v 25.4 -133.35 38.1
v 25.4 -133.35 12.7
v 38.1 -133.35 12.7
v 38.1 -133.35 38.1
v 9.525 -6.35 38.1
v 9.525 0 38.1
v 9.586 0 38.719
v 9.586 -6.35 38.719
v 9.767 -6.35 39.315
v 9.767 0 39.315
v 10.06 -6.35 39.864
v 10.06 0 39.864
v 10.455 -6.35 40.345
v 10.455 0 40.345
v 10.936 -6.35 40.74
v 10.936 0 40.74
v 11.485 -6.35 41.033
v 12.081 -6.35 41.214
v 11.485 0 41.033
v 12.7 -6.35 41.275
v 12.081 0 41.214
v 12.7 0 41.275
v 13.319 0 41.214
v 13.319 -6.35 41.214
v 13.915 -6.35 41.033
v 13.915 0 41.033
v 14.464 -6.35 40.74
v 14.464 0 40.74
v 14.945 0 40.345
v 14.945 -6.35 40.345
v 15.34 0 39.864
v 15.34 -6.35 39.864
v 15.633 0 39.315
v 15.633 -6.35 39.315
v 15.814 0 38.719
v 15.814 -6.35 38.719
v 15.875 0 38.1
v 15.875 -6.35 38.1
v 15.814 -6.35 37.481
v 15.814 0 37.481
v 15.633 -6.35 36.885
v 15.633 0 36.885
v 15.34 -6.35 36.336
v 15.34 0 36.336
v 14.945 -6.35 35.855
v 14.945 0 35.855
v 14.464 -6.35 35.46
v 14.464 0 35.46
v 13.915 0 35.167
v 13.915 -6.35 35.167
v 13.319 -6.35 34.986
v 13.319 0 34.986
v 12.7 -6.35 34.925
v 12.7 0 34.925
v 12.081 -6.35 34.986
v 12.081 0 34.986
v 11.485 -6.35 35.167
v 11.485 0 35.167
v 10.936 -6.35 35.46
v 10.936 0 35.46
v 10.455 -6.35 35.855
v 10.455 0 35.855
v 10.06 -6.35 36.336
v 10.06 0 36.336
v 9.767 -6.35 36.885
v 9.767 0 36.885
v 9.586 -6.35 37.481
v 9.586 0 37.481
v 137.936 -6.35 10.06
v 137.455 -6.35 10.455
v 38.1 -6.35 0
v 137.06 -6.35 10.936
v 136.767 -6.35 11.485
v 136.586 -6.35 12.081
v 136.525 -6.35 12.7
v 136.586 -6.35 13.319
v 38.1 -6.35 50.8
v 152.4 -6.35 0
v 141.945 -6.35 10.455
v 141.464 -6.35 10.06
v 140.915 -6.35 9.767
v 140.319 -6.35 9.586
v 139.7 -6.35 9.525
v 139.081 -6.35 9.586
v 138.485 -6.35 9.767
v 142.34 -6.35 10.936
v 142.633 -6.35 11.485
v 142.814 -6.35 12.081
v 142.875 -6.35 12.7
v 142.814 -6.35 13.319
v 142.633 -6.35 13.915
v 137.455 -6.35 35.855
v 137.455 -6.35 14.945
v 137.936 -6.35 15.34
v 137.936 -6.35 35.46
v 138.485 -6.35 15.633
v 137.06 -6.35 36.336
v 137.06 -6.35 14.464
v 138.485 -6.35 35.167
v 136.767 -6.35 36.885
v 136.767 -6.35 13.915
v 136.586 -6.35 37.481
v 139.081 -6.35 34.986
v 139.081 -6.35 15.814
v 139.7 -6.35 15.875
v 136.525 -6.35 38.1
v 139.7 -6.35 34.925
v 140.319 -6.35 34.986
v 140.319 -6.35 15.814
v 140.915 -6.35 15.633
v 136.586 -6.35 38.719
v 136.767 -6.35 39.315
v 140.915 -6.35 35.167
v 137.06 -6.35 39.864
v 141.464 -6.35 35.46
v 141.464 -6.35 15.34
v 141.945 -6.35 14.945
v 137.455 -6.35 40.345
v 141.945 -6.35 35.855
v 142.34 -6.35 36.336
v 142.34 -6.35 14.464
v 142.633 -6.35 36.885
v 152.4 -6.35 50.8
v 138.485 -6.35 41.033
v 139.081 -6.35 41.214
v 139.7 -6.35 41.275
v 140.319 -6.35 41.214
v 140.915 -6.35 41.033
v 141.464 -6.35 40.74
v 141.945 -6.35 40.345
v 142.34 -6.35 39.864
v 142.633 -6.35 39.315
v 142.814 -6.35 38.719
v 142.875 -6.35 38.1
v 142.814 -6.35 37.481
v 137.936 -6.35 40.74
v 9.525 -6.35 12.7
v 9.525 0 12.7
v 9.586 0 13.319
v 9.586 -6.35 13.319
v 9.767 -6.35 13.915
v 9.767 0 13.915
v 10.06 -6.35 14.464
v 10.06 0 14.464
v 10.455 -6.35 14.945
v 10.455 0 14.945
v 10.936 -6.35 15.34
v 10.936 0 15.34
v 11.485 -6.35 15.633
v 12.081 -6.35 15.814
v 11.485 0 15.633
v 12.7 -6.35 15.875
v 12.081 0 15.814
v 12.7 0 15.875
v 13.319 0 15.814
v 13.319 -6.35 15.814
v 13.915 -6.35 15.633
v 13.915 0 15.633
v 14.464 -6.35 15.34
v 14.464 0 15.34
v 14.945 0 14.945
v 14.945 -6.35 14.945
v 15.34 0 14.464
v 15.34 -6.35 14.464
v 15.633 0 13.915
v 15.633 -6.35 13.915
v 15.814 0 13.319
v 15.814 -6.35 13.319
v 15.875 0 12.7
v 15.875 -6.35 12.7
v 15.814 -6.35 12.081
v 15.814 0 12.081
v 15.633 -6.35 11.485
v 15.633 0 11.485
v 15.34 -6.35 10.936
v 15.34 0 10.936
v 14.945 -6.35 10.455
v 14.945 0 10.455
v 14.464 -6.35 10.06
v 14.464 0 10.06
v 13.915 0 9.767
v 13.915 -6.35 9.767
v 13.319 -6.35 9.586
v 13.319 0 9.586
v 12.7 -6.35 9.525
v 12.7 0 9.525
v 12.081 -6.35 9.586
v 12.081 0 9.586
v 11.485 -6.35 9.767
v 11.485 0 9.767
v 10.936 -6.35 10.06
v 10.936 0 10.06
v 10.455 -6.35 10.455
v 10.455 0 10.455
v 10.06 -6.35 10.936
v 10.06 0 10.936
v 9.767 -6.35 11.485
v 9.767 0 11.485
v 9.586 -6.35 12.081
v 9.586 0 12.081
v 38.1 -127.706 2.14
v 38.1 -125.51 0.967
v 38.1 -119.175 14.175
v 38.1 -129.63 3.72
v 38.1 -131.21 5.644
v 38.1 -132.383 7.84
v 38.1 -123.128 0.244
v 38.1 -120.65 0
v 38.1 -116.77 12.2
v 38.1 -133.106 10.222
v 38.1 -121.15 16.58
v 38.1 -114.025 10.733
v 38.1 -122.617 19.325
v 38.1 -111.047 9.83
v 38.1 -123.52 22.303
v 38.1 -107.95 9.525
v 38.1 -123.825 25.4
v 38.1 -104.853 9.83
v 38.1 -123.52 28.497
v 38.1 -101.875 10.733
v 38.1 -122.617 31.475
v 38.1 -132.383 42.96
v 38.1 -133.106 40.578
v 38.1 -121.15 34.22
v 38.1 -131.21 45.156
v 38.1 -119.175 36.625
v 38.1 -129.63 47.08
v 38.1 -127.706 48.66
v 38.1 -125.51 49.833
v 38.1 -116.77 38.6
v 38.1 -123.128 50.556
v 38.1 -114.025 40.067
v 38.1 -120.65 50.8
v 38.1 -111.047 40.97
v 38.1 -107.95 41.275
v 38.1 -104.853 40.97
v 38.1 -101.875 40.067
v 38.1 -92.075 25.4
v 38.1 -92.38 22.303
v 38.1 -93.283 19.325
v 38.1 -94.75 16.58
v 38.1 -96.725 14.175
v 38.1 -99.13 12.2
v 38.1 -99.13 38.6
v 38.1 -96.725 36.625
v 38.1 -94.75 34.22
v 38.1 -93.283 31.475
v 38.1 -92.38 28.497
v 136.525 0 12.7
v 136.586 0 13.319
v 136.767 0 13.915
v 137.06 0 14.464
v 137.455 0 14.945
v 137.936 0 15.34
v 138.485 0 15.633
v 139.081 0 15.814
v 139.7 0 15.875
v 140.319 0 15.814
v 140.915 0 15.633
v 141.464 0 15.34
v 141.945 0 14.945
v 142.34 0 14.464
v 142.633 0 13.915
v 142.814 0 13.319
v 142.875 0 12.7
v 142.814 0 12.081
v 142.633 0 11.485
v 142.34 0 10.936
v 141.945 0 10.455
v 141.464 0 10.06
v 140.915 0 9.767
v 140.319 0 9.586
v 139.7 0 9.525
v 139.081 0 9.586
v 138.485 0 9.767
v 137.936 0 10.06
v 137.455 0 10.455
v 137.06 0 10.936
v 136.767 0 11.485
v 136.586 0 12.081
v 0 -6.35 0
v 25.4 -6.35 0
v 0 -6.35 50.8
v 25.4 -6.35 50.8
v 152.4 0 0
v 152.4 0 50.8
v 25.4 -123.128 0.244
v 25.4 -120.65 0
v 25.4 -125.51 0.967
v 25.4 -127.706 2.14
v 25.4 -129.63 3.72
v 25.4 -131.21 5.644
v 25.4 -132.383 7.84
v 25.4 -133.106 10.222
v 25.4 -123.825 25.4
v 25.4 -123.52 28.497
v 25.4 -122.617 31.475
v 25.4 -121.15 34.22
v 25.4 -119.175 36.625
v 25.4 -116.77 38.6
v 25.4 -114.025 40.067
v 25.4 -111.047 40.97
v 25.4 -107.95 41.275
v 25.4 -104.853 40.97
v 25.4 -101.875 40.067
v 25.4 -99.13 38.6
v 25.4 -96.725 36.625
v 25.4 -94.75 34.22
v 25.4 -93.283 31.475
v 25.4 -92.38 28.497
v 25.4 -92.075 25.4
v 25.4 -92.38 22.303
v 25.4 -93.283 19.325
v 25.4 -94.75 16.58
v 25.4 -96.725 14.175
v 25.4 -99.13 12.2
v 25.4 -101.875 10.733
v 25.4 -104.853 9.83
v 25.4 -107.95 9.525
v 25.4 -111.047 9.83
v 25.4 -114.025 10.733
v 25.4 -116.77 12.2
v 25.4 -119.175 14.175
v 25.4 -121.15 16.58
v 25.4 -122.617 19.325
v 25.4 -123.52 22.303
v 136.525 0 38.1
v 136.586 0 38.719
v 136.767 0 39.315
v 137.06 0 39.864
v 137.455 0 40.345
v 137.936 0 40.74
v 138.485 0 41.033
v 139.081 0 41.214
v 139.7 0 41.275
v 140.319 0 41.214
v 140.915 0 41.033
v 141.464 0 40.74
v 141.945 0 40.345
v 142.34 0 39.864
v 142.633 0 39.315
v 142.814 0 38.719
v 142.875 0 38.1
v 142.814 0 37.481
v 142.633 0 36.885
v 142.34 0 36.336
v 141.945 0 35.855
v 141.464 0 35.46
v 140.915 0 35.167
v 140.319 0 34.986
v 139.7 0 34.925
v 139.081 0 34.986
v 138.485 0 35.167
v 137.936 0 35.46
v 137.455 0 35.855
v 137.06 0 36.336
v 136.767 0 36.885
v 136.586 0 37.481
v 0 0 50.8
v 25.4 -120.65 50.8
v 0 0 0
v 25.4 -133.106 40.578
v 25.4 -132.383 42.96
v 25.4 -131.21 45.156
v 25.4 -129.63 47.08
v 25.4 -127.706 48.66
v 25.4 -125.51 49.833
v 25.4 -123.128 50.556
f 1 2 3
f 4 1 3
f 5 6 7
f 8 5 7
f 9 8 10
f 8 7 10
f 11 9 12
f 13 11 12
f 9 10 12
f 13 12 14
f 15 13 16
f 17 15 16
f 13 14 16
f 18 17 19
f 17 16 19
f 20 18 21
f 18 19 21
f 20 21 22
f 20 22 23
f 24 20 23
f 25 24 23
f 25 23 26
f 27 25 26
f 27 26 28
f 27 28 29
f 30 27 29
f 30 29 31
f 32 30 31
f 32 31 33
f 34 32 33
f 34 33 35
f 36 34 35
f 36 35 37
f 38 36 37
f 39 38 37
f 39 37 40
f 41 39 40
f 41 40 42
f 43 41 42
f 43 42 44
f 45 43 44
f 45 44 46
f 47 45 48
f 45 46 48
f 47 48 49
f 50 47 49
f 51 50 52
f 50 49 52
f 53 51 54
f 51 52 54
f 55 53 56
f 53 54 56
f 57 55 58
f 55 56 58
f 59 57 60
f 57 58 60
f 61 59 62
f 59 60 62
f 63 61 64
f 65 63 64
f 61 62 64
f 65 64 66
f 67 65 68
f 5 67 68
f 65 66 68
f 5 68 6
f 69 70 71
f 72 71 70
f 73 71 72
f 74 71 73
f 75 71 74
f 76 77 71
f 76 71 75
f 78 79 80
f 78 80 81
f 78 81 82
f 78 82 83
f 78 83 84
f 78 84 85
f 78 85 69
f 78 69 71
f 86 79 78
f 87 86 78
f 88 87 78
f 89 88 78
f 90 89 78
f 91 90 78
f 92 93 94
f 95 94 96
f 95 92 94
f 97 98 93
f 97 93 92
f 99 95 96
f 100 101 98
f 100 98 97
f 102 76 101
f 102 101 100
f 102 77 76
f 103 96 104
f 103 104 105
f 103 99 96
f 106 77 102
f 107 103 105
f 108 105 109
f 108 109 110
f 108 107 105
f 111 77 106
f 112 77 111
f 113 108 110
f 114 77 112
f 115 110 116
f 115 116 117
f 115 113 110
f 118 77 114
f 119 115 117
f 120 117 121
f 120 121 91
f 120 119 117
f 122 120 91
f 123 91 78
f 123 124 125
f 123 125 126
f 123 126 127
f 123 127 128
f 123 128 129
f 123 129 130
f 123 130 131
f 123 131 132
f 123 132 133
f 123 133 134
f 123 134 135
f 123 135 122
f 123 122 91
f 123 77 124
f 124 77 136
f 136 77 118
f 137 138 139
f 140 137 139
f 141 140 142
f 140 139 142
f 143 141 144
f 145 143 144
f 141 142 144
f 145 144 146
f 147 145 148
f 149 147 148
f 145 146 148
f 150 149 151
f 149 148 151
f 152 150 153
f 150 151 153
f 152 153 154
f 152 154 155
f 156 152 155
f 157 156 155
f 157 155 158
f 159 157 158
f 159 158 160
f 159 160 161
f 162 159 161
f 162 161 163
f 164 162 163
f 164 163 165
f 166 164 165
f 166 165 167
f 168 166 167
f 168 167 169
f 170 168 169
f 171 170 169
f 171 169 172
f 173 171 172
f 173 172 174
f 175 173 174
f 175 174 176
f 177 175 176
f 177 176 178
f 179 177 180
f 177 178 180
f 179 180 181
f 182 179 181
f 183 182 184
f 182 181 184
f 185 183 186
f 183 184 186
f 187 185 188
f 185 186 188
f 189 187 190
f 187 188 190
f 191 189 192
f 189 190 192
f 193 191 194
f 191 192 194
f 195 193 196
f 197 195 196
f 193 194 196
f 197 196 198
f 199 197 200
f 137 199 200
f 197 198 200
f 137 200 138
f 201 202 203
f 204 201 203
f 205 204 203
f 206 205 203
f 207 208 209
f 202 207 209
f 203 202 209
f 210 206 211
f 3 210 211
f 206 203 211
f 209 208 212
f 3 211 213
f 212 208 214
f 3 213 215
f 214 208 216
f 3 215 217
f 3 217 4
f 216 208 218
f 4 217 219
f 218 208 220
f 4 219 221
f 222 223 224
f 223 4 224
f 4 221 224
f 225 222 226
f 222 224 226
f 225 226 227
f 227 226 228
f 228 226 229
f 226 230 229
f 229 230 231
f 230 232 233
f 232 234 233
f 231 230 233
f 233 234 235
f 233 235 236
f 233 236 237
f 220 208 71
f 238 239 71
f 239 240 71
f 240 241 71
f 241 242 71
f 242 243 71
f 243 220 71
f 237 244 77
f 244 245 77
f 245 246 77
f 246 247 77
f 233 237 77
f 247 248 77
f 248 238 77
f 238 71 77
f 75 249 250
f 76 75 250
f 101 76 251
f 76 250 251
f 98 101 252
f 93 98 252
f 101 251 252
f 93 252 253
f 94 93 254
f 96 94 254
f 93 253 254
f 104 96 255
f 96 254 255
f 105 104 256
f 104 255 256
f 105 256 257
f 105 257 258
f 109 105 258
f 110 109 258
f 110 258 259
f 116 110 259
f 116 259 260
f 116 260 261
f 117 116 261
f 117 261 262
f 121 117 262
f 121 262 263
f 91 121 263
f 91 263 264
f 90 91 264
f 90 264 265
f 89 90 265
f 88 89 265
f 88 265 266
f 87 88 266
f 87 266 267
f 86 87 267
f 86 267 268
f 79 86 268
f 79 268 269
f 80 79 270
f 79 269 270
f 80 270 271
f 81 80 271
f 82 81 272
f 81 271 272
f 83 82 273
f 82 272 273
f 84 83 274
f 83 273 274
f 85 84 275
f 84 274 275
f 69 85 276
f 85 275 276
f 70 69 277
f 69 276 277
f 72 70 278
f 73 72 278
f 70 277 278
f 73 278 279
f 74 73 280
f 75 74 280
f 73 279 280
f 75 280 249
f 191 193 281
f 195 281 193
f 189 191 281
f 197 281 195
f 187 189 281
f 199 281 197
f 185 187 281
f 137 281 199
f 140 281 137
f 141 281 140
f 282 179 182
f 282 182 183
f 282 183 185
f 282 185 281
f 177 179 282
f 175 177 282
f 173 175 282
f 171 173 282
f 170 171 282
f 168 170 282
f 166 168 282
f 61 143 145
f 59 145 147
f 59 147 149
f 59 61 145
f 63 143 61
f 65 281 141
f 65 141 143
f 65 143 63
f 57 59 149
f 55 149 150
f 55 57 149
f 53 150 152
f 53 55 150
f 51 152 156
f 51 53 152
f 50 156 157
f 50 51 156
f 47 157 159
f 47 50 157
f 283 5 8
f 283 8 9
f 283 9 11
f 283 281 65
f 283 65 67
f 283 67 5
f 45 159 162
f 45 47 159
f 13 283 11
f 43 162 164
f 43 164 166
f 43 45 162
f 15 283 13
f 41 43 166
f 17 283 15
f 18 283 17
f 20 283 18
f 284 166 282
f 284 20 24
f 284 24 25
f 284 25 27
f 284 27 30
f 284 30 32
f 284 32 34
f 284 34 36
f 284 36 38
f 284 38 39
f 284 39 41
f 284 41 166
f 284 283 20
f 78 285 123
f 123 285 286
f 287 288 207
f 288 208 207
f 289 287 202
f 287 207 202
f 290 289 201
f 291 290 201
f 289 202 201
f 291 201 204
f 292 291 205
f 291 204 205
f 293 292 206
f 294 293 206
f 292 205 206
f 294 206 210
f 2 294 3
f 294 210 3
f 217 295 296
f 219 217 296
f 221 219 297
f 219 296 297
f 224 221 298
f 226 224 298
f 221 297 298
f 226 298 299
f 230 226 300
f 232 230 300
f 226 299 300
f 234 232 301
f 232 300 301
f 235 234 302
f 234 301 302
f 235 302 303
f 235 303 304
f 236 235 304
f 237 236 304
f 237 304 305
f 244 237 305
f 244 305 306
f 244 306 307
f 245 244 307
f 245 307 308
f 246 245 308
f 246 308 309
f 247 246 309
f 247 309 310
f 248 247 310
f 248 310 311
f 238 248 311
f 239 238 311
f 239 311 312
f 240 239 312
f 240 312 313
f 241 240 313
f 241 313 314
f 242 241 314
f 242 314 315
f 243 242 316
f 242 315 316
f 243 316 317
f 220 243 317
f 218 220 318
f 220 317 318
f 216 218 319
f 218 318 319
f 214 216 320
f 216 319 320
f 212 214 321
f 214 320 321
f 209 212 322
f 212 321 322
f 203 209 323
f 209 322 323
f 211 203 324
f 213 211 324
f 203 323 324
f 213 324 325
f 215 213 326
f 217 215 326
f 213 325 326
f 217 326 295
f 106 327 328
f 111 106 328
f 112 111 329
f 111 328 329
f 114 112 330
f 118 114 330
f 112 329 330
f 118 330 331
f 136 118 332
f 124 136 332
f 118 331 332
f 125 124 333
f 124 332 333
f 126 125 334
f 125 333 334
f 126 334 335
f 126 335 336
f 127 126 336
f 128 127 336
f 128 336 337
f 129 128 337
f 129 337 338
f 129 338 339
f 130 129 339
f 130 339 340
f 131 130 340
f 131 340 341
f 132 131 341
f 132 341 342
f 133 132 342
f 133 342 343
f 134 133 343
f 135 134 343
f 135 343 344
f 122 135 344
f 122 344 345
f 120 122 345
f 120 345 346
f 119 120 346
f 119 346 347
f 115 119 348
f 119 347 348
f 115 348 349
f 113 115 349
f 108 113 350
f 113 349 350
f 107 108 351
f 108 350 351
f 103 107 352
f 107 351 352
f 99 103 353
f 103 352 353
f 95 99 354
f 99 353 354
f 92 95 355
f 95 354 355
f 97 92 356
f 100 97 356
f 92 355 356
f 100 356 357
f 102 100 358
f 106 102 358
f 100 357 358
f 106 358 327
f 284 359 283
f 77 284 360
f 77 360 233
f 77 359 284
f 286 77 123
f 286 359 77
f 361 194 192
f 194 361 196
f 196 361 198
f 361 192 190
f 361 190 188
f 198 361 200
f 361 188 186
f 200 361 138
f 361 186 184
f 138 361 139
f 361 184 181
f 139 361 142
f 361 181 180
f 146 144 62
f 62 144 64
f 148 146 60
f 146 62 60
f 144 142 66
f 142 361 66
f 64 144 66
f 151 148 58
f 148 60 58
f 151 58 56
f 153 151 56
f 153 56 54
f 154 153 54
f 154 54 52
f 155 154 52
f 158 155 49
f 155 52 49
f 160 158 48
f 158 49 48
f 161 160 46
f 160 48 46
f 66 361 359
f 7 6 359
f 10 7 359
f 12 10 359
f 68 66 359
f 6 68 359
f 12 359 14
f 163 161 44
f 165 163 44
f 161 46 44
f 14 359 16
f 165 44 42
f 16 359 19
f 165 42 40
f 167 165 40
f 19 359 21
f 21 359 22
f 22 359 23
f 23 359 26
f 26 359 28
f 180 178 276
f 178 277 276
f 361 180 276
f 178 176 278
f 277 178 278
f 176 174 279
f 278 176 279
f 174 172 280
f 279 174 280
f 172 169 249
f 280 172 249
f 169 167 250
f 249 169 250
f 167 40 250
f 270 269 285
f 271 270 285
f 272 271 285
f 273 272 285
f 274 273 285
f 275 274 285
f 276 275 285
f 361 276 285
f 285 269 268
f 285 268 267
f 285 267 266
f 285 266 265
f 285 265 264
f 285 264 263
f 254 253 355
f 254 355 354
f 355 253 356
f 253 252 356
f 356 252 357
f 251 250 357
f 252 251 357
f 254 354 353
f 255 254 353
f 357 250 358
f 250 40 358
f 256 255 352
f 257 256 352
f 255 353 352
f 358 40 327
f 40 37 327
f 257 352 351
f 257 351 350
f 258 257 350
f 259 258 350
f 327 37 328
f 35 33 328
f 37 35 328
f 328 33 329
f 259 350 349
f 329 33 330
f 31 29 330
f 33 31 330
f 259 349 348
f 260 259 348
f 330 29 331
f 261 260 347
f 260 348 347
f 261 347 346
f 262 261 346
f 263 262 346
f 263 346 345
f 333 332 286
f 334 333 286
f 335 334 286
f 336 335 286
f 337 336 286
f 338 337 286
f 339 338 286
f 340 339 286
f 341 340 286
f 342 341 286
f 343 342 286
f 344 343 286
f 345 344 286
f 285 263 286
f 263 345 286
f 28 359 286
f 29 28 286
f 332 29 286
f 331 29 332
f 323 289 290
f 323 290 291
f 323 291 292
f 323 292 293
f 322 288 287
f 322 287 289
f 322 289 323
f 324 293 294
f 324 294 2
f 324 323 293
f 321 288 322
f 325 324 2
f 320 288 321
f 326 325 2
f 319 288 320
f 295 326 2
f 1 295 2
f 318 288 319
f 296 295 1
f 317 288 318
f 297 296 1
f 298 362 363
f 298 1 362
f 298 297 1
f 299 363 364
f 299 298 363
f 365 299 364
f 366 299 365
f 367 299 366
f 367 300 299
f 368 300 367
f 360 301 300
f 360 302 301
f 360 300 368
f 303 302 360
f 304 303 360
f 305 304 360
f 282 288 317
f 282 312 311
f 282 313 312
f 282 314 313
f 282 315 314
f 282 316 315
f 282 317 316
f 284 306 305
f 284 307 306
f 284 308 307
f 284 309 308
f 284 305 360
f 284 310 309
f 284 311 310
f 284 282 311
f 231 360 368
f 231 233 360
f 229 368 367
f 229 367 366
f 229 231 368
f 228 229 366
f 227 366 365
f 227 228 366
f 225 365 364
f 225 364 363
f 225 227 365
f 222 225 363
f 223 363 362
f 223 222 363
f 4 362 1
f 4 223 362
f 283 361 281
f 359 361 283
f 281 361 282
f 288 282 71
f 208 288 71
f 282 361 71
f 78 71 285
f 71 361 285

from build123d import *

# Parameters (mm, degrees)
F0_W     = 152.4
F0_H     = 50.8
F1_DEPTH = 6.35
F3_D     = 6.35
F4_W     = 12.7
F4_H     = 50.8
F5_DEPTH = 127
F6_R     = 12.7
F8_D     = 31.75


with BuildPart() as f1:
    # F0 (on Front) → F1 (new body)
    with BuildSketch(Plane.XZ):
        with Locations((76.2, 25.4)):
            Rectangle(F0_W, F0_H)
    extrude(amount=F1_DEPTH)

    # F3 (through all)
    with Locations(Plane.XZ.offset(6.35)):
        with Locations((12.7, 38.1), (12.7, 12.7), (139.7, 38.1), (139.7, 12.7)):
            Hole(F3_D / 2)

    # F4 (on face) → F5 (join)
    with BuildSketch(Plane.XZ.offset(6.35)):
        with Locations((31.75, 25.4)):
            Rectangle(F4_W, F4_H)
    extrude(amount=F5_DEPTH)

    # F6
    f6_edges = [f1.edges().sort_by_distance(p)[0] for p in [
        (31.75, -133.35, 0),
        (31.75, -133.35, 50.8),
    ]]
    fillet(f6_edges, radius=F6_R)

    # F8 (through all)
    with Locations(Plane.YZ.offset(38.1)):
        with Locations((-107.95, 25.4)):
            Hole(F8_D / 2)


solid = f1.part
